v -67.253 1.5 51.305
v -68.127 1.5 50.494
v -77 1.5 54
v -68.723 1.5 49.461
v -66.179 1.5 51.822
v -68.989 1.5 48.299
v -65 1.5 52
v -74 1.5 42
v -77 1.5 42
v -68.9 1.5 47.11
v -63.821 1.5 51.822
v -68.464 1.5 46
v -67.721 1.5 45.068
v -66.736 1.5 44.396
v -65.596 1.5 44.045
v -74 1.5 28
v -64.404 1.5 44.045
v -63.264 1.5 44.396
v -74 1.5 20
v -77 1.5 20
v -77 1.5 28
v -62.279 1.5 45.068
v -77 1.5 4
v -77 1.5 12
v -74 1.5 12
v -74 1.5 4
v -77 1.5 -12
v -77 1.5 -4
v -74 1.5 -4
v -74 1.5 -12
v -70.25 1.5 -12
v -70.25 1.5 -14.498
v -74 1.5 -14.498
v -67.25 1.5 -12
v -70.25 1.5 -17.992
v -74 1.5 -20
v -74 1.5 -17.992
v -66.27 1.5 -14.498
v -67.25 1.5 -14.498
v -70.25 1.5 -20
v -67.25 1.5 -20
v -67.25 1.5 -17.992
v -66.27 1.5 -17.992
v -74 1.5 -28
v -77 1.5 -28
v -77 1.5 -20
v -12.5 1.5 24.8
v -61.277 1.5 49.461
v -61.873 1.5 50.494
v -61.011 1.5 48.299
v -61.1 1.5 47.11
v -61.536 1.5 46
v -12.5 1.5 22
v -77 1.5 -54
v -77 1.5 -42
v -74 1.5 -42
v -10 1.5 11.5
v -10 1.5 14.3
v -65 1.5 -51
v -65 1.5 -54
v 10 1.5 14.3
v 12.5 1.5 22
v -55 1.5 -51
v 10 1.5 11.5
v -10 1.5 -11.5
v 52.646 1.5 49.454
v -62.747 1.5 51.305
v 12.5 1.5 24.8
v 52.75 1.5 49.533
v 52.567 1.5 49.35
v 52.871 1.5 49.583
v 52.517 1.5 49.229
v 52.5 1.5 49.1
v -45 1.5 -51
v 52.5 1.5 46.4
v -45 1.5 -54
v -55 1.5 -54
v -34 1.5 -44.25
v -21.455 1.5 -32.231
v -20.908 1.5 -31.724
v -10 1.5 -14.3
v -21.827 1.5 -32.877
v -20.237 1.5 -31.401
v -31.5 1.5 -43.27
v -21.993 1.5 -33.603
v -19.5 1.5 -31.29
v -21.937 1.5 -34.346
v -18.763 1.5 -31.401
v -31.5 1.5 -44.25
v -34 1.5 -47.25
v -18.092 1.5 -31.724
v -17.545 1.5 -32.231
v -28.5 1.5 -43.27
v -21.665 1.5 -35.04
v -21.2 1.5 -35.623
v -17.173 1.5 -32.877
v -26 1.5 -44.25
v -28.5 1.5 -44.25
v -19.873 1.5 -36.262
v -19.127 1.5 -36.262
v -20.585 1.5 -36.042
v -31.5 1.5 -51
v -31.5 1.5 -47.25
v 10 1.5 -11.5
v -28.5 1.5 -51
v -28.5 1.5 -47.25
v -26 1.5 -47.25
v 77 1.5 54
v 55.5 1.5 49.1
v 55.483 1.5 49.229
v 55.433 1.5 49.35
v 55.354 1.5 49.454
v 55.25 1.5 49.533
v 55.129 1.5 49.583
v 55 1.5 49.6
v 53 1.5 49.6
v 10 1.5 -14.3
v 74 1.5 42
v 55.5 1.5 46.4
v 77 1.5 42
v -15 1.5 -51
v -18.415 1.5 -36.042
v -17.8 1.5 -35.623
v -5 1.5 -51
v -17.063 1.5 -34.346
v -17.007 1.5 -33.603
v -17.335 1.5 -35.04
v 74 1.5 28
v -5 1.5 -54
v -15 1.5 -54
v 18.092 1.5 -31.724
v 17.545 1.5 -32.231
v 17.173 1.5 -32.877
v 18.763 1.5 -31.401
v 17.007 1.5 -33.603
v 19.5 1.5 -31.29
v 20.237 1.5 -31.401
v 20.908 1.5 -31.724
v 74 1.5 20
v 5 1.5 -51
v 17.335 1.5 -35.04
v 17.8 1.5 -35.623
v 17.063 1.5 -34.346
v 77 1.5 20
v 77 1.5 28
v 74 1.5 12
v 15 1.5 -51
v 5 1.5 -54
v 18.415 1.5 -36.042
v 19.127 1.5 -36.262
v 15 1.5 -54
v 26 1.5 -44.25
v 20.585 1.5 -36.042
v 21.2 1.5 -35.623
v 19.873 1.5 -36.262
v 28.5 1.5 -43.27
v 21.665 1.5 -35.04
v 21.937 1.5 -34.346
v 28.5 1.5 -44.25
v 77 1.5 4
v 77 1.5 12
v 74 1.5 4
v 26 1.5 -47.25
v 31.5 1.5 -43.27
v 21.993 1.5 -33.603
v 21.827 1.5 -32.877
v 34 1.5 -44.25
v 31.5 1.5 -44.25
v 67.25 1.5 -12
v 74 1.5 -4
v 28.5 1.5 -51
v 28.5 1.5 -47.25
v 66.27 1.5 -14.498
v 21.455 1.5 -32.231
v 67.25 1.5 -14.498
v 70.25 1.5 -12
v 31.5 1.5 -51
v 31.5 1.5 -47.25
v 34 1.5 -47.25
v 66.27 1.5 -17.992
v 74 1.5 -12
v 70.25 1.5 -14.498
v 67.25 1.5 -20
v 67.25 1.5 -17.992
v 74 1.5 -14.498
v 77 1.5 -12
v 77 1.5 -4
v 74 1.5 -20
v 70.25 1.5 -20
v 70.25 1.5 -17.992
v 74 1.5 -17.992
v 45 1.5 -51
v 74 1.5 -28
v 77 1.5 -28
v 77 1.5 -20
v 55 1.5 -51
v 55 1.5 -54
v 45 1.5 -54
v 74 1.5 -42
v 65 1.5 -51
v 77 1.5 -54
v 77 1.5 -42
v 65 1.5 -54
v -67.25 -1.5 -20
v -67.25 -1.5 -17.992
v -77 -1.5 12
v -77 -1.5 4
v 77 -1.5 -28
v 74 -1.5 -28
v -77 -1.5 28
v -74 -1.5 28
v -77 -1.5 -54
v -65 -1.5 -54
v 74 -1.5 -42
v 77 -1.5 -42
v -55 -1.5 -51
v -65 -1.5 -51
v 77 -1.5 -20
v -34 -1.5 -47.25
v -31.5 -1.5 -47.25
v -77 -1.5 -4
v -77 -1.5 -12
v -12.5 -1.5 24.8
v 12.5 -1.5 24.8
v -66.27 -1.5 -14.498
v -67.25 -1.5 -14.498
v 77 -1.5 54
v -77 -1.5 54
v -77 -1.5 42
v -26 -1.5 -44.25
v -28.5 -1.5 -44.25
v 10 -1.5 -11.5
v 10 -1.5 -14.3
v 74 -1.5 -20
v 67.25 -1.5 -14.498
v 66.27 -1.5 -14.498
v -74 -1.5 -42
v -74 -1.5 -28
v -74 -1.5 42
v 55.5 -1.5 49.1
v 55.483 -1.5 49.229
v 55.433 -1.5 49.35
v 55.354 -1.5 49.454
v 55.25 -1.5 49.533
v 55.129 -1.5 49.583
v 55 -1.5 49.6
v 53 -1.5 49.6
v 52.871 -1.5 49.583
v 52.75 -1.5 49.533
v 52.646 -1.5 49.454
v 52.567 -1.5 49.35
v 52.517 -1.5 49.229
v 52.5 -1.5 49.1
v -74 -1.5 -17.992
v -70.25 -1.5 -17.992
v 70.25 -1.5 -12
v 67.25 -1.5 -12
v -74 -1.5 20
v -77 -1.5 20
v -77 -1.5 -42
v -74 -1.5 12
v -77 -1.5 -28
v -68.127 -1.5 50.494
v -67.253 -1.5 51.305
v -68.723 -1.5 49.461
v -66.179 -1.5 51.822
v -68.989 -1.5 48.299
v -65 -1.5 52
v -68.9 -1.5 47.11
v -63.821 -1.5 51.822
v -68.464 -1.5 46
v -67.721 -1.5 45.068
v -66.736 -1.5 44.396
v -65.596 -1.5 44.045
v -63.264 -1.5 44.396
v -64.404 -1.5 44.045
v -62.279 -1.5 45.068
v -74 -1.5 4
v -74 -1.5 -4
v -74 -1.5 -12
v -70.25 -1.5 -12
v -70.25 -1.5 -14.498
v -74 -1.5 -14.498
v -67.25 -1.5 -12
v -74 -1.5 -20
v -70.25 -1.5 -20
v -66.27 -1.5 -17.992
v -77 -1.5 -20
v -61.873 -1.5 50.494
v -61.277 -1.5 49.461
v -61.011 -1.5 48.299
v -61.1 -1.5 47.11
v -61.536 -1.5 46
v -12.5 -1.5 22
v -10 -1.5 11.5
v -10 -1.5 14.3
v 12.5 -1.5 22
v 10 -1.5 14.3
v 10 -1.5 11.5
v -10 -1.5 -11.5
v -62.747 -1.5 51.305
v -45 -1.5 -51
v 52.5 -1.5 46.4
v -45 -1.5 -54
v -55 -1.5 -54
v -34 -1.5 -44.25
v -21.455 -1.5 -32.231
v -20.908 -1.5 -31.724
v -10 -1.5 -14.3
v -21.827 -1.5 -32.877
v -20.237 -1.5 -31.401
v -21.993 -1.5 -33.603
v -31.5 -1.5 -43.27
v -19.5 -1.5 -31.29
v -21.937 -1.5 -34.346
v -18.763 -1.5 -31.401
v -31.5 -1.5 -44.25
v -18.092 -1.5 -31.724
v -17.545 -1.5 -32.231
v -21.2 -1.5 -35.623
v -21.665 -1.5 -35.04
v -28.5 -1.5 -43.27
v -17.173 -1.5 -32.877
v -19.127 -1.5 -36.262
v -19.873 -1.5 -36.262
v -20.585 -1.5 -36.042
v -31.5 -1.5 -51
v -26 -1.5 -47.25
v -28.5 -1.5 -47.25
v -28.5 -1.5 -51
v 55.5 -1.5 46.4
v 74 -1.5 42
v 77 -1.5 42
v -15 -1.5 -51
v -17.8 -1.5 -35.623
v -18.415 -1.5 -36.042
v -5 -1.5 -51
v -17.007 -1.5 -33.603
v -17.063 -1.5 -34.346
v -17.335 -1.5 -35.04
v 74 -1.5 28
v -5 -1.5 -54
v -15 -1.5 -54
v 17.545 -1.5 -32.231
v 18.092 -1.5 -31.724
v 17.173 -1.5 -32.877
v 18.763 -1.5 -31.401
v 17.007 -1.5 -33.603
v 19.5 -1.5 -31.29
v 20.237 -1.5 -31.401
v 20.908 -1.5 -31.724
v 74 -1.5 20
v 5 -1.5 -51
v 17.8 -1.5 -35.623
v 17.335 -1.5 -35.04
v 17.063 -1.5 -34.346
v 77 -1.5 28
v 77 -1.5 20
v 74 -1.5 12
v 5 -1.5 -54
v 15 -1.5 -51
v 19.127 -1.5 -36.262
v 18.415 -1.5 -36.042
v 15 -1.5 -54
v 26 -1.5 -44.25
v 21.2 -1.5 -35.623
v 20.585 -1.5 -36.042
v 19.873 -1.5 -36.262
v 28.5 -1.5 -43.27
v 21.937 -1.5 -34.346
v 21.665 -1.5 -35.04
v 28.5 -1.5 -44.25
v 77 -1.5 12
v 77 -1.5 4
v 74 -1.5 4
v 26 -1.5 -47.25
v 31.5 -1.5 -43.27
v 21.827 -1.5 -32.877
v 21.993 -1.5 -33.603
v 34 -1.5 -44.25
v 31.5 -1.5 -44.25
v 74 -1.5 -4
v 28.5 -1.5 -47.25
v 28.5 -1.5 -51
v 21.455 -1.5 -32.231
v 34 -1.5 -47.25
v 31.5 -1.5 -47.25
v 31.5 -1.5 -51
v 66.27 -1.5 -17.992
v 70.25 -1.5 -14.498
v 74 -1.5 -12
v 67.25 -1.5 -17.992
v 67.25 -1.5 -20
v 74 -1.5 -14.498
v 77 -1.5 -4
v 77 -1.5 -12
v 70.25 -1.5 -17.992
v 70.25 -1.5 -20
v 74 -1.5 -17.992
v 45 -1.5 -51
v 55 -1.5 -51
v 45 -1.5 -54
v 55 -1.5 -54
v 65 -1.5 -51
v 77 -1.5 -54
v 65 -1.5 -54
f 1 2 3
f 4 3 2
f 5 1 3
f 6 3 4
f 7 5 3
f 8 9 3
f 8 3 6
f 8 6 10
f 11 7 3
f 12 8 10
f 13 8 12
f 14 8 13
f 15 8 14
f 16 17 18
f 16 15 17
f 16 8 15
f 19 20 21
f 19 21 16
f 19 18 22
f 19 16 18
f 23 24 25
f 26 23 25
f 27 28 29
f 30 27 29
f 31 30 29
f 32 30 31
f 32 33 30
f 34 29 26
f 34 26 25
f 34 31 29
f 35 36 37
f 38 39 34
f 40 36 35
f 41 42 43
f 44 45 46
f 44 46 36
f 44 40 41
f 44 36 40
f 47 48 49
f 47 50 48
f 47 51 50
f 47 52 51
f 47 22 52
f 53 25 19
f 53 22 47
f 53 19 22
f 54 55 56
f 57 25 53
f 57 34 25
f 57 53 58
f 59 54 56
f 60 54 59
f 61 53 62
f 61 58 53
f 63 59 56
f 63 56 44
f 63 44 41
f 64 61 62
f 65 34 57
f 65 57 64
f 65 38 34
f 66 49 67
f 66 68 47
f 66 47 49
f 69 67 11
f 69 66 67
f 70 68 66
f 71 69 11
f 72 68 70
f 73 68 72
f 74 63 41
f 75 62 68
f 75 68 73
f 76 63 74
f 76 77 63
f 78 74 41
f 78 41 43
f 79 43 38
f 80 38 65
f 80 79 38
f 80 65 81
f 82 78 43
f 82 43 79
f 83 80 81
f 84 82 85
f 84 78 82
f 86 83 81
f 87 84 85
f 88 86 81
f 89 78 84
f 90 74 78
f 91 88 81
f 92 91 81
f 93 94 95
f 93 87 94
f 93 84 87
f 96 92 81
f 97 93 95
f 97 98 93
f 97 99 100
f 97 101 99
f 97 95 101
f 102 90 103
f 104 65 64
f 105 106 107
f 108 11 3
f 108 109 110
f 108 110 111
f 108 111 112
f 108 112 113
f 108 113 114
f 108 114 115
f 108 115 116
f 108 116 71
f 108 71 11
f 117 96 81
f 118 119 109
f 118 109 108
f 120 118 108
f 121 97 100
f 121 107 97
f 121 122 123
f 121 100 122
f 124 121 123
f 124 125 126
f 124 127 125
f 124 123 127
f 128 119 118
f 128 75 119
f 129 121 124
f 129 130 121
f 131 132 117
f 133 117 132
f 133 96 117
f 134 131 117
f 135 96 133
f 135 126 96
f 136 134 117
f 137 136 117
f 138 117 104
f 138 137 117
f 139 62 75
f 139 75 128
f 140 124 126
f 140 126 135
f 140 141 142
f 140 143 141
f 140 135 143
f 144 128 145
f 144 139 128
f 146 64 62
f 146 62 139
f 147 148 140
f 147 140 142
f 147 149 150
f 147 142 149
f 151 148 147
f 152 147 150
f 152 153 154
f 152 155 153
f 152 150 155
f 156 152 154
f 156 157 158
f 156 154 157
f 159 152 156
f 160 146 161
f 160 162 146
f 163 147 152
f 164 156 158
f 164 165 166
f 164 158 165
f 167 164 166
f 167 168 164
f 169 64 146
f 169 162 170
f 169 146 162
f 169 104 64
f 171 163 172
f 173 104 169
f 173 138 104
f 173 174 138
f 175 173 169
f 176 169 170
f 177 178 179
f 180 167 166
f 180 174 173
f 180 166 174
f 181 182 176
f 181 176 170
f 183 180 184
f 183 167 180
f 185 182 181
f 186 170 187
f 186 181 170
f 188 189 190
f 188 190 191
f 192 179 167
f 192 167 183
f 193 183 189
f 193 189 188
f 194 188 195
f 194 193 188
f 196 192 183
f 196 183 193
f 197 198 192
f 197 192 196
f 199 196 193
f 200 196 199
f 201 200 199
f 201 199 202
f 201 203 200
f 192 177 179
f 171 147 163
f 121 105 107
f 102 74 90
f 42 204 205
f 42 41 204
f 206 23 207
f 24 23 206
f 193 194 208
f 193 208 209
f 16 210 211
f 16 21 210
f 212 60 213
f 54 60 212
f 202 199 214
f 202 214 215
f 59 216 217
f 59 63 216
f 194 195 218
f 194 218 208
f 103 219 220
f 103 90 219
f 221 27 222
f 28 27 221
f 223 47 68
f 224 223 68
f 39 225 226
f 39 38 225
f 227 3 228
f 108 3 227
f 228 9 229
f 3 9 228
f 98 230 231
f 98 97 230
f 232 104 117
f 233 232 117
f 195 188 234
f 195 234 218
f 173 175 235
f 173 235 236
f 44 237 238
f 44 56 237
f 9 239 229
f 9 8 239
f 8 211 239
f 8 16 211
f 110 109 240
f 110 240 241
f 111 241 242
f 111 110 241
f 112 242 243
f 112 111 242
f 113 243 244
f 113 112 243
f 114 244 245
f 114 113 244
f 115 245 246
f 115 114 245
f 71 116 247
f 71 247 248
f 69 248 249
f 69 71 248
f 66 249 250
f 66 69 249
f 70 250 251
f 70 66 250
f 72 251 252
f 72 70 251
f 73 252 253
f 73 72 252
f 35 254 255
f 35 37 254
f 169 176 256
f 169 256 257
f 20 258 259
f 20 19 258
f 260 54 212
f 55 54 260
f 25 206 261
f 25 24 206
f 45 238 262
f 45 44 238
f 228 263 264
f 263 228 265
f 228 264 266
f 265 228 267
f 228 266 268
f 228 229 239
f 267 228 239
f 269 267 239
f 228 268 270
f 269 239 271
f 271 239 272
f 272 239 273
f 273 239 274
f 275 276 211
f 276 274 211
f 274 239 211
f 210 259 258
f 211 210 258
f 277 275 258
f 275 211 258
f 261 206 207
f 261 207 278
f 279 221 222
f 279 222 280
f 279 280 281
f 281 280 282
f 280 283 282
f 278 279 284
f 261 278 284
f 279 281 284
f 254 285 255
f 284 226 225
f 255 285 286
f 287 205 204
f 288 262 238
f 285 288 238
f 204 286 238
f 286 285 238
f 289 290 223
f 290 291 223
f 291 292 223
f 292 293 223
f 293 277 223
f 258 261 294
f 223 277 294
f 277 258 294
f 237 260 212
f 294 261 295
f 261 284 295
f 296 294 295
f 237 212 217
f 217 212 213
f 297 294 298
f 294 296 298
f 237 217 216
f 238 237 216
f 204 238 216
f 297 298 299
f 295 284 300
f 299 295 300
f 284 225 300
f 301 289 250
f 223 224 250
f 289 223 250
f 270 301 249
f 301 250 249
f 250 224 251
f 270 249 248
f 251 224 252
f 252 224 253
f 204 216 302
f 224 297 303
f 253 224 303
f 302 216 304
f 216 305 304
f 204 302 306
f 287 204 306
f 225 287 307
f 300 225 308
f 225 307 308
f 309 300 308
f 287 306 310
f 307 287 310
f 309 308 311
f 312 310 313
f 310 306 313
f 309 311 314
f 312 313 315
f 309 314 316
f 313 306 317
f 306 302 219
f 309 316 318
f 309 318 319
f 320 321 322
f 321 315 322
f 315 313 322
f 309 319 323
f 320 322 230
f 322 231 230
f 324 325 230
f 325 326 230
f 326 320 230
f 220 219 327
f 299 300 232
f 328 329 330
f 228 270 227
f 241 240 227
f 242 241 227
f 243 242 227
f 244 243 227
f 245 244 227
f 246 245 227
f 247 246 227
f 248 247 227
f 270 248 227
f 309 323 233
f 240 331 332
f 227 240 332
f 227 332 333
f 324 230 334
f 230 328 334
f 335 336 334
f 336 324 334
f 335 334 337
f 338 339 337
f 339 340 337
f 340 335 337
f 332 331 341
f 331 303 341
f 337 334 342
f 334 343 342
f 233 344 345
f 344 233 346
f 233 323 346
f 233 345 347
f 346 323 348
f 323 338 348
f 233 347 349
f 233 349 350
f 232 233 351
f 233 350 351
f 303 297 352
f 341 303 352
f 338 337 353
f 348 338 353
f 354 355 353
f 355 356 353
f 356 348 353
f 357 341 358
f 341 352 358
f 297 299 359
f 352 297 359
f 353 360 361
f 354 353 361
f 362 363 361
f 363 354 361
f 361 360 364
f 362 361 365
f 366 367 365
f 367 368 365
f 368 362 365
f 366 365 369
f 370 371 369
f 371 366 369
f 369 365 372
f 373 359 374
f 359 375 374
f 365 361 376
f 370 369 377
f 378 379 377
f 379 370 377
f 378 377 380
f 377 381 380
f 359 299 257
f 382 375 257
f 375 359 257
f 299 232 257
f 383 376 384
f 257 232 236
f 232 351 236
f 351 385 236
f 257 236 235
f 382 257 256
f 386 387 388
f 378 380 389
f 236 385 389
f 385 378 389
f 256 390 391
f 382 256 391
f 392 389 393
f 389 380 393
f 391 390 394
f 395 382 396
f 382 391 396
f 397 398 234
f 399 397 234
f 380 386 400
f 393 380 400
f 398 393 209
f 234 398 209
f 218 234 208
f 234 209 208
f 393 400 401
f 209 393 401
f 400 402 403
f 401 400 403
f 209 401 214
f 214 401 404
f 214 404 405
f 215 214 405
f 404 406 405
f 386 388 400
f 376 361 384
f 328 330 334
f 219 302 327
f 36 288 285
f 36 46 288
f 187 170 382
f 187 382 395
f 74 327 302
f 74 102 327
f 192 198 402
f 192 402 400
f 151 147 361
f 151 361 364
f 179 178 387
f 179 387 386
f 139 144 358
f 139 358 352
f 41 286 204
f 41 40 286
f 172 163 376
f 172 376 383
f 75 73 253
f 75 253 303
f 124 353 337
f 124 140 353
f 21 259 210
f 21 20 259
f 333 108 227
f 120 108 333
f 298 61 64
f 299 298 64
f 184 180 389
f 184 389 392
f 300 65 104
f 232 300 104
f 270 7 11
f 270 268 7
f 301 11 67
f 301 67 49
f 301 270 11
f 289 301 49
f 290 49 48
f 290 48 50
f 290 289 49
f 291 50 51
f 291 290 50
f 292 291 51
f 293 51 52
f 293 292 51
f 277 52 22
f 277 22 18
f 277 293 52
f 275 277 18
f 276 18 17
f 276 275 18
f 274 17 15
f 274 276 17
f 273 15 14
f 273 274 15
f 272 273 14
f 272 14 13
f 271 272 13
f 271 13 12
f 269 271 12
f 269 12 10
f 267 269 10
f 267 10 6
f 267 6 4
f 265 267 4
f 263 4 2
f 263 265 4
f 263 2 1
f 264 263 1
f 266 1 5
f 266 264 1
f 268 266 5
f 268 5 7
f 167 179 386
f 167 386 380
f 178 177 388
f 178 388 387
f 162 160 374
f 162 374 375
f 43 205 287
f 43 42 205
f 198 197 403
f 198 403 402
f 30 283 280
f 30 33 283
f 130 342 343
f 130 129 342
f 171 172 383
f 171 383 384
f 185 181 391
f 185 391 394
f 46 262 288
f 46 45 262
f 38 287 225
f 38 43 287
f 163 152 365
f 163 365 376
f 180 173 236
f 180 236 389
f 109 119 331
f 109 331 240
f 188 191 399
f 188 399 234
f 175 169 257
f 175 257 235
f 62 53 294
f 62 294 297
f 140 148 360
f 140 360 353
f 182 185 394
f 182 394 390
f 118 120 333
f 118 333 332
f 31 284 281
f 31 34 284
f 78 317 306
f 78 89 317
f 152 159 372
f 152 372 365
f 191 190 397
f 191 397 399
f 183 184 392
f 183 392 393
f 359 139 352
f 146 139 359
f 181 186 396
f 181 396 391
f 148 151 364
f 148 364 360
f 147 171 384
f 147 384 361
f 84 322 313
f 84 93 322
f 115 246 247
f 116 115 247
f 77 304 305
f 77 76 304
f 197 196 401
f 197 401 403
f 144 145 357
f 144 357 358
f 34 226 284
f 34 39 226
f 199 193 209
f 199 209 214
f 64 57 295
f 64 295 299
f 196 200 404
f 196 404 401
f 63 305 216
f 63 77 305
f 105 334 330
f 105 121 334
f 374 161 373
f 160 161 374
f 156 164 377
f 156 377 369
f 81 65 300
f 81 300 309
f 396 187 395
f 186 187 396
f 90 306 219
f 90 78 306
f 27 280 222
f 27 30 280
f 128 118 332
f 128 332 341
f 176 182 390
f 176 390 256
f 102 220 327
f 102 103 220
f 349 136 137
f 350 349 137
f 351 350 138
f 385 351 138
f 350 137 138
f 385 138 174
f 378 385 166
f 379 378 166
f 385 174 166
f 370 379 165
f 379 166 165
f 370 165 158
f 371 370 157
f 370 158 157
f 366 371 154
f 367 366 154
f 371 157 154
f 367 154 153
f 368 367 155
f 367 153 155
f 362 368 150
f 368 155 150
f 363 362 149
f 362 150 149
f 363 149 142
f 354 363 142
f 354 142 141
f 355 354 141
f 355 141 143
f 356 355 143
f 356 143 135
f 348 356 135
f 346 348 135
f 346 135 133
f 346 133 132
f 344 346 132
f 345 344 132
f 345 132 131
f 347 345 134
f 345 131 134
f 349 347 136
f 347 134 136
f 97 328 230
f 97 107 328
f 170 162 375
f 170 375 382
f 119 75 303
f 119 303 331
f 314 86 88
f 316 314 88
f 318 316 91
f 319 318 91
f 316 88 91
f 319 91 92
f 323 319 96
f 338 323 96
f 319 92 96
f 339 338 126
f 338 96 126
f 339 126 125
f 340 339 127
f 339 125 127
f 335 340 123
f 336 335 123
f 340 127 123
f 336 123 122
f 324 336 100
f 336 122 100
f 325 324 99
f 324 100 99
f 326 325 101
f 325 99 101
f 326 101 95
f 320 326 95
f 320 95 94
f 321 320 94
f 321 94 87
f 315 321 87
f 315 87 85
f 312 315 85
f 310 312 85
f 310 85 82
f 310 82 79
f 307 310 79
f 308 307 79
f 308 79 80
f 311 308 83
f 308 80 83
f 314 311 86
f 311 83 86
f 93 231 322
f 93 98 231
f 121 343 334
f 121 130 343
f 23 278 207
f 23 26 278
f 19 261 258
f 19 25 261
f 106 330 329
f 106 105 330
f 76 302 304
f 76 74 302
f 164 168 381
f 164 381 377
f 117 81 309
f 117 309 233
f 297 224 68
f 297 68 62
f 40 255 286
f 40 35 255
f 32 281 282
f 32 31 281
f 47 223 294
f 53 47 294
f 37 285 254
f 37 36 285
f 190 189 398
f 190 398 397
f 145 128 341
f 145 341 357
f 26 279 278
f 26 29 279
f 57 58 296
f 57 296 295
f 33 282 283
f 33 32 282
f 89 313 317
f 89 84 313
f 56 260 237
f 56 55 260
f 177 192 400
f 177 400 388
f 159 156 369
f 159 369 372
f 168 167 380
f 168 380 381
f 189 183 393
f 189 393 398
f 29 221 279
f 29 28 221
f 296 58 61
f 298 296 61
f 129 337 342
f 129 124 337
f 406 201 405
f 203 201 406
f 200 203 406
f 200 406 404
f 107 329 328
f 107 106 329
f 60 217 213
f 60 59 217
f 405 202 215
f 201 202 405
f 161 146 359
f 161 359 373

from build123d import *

# Parameters (mm, degrees)
CROQUIS1_R              = 4
SALIENTE_EXTRUIR1_DEPTH = 1.5
CROQUIS3_R              = 2.5
CROQUIS3_W              = 20
CROQUIS3_H              = 2.8
CROQUIS3_W_2            = 25
CORTAR_EXTRUIR2_DEPTH   = 3


with BuildPart() as part:
    # Croquis1 → Saliente-Extruir1 (new, symmetric)
    with BuildSketch(Plane(origin=(0, 0, 0), x_dir=(1, 0, 0), z_dir=(0, 1, 0))):
        Polygon((-77, -42), (-77, -54), (77, -54), (77, -42), (74, -42), (74, -28), (77, -28), (77, -20), (74, -20), (74, -12), (77, -12), (77, -4), (74, -4), (74, -1.5), (74, 1.5), (74, 4), (77, 4), (77, 12), (74, 12), (74, 14.497912952), (70.25, 14.497912952), (70.25, 12), (67.25, 12), (67.25, 14.497912952), (66.27, 14.497912952), (66.27, 17.992083938), (67.25, 17.992083938), (67.25, 20), (70.25, 20), (70.25, 17.992083938), (74, 17.992083938), (74, 20), (77, 20), (77, 28), (74, 28), (74, 42), (77, 42), (77, 54), (65, 54), (65, 51), (55, 51), (55, 54), (45, 54), (45, 51), (31.5, 51), (31.5, 47.25), (34, 47.25), (34, 44.25), (31.5, 44.25), (31.5, 43.27), (28.5, 43.27), (28.5, 44.25), (26, 44.25), (26, 47.25), (28.5, 47.25), (28.5, 51), (15, 51), (15, 54), (5, 54), (5, 51), (-5, 51), (-5, 54), (-15, 54), (-15, 51), (-28.5, 51), (-28.5, 47.25), (-26, 47.25), (-26, 44.25), (-28.5, 44.25), (-28.5, 43.27), (-31.5, 43.27), (-31.5, 44.25), (-34, 44.25), (-34, 47.25), (-31.5, 47.25), (-31.5, 51), (-45, 51), (-45, 54), (-55, 54), (-55, 51), (-65, 51), (-65, 54), (-77, 54), (-77, 42), (-74, 42), (-74, 28), (-77, 28), (-77, 20), (-74, 20), (-74, 17.992083938), (-70.25, 17.992083938), (-70.25, 20), (-67.25, 20), (-67.25, 17.992083938), (-66.27, 17.992083938), (-66.27, 14.497912952), (-67.25, 14.497912952), (-67.25, 12), (-70.25, 12), (-70.25, 14.497912952), (-74, 14.497912952), (-74, 12), (-77, 12), (-77, 4), (-74, 4), (-74, 1.5), (-74, -1.5), (-74, -4), (-77, -4), (-77, -12), (-74, -12), (-74, -20), (-77, -20), (-77, -28), (-74, -28), (-74, -42), align=None)
        with Locations(Location((-65, -48, 0), (0, 0, 270))):
            Circle(CROQUIS1_R, mode=Mode.SUBTRACT)
        with BuildLine():
            Line((55, -49.6), (53, -49.6))
            ThreePointArc((53, -49.6), (52.646446609, -49.453553391), (52.5, -49.1))
            Line((52.5, -49.1), (52.5, -46.4))
            Line((52.5, -46.4), (55.5, -46.4))
            Line((55.5, -46.4), (55.5, -49.1))
            ThreePointArc((55.5, -49.1), (55.353553391, -49.453553391), (55, -49.6))
        make_face(mode=Mode.SUBTRACT)
    extrude(amount=SALIENTE_EXTRUIR1_DEPTH, both=True)

    # Croquis3 → Cortar-Extruir2 (cut)
    with BuildSketch(Plane(origin=(0, 1.5, 0), x_dir=(1, 0, 0), z_dir=(0, 1, 0))):
        with Locations(Location((-19.5, 33.79, 0), (0, 0, 270))):
            Circle(CROQUIS3_R)
        with Locations(Location((19.5, 33.79, 0), (0, 0, 270))):
            Circle(CROQUIS3_R)
        with Locations((0, 12.9)):
            Rectangle(CROQUIS3_W, CROQUIS3_H)
        with Locations((0, -12.9)):
            Rectangle(CROQUIS3_W, CROQUIS3_H)
        with Locations((0, -23.4)):
            Rectangle(CROQUIS3_W_2, CROQUIS3_H)
    extrude(amount=-CORTAR_EXTRUIR2_DEPTH, mode=Mode.SUBTRACT)


solid = part.part
